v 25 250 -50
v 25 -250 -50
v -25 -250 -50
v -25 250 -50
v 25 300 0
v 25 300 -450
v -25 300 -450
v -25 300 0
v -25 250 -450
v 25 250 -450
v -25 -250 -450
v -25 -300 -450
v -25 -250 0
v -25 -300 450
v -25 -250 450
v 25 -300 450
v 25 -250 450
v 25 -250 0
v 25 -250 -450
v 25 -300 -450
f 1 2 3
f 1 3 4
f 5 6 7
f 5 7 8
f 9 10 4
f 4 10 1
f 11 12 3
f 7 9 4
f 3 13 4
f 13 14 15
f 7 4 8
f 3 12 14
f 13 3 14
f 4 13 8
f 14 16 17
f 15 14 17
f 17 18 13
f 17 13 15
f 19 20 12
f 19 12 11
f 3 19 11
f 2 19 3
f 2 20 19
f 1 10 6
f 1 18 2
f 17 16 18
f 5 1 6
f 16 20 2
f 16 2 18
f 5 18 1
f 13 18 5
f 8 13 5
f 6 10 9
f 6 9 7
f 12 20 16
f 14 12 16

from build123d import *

# Parameters (mm, degrees)
F0_W     = 600
F0_H     = 900
F1_DEPTH = 25
F2_W     = 550
F2_H     = 450
F3_DEPTH = 50.001
F4_W     = 500
F4_H     = 400
F5_DEPTH = 50.001


with BuildPart() as f1:
    # F0 (on Right) → F1 (new body, symmetric)
    with BuildSketch(Plane.YZ):
        Rectangle(F0_W, F0_H)
    extrude(amount=F1_DEPTH, both=True)

    # F2 (on face) → F3 (cut, through all)
    with BuildSketch(Plane.YZ.offset(25)):
        with Locations((25, 225)):
            Rectangle(F2_W, F2_H)
    extrude(amount=-F3_DEPTH, mode=Mode.SUBTRACT)

    # F4 (on face) → F5 (cut, through all)
    with BuildSketch(Plane.YZ.offset(25)):
        with Locations((0, -250)):
            Rectangle(F4_W, F4_H)
    extrude(amount=-F5_DEPTH, mode=Mode.SUBTRACT)


solid = f1.part
